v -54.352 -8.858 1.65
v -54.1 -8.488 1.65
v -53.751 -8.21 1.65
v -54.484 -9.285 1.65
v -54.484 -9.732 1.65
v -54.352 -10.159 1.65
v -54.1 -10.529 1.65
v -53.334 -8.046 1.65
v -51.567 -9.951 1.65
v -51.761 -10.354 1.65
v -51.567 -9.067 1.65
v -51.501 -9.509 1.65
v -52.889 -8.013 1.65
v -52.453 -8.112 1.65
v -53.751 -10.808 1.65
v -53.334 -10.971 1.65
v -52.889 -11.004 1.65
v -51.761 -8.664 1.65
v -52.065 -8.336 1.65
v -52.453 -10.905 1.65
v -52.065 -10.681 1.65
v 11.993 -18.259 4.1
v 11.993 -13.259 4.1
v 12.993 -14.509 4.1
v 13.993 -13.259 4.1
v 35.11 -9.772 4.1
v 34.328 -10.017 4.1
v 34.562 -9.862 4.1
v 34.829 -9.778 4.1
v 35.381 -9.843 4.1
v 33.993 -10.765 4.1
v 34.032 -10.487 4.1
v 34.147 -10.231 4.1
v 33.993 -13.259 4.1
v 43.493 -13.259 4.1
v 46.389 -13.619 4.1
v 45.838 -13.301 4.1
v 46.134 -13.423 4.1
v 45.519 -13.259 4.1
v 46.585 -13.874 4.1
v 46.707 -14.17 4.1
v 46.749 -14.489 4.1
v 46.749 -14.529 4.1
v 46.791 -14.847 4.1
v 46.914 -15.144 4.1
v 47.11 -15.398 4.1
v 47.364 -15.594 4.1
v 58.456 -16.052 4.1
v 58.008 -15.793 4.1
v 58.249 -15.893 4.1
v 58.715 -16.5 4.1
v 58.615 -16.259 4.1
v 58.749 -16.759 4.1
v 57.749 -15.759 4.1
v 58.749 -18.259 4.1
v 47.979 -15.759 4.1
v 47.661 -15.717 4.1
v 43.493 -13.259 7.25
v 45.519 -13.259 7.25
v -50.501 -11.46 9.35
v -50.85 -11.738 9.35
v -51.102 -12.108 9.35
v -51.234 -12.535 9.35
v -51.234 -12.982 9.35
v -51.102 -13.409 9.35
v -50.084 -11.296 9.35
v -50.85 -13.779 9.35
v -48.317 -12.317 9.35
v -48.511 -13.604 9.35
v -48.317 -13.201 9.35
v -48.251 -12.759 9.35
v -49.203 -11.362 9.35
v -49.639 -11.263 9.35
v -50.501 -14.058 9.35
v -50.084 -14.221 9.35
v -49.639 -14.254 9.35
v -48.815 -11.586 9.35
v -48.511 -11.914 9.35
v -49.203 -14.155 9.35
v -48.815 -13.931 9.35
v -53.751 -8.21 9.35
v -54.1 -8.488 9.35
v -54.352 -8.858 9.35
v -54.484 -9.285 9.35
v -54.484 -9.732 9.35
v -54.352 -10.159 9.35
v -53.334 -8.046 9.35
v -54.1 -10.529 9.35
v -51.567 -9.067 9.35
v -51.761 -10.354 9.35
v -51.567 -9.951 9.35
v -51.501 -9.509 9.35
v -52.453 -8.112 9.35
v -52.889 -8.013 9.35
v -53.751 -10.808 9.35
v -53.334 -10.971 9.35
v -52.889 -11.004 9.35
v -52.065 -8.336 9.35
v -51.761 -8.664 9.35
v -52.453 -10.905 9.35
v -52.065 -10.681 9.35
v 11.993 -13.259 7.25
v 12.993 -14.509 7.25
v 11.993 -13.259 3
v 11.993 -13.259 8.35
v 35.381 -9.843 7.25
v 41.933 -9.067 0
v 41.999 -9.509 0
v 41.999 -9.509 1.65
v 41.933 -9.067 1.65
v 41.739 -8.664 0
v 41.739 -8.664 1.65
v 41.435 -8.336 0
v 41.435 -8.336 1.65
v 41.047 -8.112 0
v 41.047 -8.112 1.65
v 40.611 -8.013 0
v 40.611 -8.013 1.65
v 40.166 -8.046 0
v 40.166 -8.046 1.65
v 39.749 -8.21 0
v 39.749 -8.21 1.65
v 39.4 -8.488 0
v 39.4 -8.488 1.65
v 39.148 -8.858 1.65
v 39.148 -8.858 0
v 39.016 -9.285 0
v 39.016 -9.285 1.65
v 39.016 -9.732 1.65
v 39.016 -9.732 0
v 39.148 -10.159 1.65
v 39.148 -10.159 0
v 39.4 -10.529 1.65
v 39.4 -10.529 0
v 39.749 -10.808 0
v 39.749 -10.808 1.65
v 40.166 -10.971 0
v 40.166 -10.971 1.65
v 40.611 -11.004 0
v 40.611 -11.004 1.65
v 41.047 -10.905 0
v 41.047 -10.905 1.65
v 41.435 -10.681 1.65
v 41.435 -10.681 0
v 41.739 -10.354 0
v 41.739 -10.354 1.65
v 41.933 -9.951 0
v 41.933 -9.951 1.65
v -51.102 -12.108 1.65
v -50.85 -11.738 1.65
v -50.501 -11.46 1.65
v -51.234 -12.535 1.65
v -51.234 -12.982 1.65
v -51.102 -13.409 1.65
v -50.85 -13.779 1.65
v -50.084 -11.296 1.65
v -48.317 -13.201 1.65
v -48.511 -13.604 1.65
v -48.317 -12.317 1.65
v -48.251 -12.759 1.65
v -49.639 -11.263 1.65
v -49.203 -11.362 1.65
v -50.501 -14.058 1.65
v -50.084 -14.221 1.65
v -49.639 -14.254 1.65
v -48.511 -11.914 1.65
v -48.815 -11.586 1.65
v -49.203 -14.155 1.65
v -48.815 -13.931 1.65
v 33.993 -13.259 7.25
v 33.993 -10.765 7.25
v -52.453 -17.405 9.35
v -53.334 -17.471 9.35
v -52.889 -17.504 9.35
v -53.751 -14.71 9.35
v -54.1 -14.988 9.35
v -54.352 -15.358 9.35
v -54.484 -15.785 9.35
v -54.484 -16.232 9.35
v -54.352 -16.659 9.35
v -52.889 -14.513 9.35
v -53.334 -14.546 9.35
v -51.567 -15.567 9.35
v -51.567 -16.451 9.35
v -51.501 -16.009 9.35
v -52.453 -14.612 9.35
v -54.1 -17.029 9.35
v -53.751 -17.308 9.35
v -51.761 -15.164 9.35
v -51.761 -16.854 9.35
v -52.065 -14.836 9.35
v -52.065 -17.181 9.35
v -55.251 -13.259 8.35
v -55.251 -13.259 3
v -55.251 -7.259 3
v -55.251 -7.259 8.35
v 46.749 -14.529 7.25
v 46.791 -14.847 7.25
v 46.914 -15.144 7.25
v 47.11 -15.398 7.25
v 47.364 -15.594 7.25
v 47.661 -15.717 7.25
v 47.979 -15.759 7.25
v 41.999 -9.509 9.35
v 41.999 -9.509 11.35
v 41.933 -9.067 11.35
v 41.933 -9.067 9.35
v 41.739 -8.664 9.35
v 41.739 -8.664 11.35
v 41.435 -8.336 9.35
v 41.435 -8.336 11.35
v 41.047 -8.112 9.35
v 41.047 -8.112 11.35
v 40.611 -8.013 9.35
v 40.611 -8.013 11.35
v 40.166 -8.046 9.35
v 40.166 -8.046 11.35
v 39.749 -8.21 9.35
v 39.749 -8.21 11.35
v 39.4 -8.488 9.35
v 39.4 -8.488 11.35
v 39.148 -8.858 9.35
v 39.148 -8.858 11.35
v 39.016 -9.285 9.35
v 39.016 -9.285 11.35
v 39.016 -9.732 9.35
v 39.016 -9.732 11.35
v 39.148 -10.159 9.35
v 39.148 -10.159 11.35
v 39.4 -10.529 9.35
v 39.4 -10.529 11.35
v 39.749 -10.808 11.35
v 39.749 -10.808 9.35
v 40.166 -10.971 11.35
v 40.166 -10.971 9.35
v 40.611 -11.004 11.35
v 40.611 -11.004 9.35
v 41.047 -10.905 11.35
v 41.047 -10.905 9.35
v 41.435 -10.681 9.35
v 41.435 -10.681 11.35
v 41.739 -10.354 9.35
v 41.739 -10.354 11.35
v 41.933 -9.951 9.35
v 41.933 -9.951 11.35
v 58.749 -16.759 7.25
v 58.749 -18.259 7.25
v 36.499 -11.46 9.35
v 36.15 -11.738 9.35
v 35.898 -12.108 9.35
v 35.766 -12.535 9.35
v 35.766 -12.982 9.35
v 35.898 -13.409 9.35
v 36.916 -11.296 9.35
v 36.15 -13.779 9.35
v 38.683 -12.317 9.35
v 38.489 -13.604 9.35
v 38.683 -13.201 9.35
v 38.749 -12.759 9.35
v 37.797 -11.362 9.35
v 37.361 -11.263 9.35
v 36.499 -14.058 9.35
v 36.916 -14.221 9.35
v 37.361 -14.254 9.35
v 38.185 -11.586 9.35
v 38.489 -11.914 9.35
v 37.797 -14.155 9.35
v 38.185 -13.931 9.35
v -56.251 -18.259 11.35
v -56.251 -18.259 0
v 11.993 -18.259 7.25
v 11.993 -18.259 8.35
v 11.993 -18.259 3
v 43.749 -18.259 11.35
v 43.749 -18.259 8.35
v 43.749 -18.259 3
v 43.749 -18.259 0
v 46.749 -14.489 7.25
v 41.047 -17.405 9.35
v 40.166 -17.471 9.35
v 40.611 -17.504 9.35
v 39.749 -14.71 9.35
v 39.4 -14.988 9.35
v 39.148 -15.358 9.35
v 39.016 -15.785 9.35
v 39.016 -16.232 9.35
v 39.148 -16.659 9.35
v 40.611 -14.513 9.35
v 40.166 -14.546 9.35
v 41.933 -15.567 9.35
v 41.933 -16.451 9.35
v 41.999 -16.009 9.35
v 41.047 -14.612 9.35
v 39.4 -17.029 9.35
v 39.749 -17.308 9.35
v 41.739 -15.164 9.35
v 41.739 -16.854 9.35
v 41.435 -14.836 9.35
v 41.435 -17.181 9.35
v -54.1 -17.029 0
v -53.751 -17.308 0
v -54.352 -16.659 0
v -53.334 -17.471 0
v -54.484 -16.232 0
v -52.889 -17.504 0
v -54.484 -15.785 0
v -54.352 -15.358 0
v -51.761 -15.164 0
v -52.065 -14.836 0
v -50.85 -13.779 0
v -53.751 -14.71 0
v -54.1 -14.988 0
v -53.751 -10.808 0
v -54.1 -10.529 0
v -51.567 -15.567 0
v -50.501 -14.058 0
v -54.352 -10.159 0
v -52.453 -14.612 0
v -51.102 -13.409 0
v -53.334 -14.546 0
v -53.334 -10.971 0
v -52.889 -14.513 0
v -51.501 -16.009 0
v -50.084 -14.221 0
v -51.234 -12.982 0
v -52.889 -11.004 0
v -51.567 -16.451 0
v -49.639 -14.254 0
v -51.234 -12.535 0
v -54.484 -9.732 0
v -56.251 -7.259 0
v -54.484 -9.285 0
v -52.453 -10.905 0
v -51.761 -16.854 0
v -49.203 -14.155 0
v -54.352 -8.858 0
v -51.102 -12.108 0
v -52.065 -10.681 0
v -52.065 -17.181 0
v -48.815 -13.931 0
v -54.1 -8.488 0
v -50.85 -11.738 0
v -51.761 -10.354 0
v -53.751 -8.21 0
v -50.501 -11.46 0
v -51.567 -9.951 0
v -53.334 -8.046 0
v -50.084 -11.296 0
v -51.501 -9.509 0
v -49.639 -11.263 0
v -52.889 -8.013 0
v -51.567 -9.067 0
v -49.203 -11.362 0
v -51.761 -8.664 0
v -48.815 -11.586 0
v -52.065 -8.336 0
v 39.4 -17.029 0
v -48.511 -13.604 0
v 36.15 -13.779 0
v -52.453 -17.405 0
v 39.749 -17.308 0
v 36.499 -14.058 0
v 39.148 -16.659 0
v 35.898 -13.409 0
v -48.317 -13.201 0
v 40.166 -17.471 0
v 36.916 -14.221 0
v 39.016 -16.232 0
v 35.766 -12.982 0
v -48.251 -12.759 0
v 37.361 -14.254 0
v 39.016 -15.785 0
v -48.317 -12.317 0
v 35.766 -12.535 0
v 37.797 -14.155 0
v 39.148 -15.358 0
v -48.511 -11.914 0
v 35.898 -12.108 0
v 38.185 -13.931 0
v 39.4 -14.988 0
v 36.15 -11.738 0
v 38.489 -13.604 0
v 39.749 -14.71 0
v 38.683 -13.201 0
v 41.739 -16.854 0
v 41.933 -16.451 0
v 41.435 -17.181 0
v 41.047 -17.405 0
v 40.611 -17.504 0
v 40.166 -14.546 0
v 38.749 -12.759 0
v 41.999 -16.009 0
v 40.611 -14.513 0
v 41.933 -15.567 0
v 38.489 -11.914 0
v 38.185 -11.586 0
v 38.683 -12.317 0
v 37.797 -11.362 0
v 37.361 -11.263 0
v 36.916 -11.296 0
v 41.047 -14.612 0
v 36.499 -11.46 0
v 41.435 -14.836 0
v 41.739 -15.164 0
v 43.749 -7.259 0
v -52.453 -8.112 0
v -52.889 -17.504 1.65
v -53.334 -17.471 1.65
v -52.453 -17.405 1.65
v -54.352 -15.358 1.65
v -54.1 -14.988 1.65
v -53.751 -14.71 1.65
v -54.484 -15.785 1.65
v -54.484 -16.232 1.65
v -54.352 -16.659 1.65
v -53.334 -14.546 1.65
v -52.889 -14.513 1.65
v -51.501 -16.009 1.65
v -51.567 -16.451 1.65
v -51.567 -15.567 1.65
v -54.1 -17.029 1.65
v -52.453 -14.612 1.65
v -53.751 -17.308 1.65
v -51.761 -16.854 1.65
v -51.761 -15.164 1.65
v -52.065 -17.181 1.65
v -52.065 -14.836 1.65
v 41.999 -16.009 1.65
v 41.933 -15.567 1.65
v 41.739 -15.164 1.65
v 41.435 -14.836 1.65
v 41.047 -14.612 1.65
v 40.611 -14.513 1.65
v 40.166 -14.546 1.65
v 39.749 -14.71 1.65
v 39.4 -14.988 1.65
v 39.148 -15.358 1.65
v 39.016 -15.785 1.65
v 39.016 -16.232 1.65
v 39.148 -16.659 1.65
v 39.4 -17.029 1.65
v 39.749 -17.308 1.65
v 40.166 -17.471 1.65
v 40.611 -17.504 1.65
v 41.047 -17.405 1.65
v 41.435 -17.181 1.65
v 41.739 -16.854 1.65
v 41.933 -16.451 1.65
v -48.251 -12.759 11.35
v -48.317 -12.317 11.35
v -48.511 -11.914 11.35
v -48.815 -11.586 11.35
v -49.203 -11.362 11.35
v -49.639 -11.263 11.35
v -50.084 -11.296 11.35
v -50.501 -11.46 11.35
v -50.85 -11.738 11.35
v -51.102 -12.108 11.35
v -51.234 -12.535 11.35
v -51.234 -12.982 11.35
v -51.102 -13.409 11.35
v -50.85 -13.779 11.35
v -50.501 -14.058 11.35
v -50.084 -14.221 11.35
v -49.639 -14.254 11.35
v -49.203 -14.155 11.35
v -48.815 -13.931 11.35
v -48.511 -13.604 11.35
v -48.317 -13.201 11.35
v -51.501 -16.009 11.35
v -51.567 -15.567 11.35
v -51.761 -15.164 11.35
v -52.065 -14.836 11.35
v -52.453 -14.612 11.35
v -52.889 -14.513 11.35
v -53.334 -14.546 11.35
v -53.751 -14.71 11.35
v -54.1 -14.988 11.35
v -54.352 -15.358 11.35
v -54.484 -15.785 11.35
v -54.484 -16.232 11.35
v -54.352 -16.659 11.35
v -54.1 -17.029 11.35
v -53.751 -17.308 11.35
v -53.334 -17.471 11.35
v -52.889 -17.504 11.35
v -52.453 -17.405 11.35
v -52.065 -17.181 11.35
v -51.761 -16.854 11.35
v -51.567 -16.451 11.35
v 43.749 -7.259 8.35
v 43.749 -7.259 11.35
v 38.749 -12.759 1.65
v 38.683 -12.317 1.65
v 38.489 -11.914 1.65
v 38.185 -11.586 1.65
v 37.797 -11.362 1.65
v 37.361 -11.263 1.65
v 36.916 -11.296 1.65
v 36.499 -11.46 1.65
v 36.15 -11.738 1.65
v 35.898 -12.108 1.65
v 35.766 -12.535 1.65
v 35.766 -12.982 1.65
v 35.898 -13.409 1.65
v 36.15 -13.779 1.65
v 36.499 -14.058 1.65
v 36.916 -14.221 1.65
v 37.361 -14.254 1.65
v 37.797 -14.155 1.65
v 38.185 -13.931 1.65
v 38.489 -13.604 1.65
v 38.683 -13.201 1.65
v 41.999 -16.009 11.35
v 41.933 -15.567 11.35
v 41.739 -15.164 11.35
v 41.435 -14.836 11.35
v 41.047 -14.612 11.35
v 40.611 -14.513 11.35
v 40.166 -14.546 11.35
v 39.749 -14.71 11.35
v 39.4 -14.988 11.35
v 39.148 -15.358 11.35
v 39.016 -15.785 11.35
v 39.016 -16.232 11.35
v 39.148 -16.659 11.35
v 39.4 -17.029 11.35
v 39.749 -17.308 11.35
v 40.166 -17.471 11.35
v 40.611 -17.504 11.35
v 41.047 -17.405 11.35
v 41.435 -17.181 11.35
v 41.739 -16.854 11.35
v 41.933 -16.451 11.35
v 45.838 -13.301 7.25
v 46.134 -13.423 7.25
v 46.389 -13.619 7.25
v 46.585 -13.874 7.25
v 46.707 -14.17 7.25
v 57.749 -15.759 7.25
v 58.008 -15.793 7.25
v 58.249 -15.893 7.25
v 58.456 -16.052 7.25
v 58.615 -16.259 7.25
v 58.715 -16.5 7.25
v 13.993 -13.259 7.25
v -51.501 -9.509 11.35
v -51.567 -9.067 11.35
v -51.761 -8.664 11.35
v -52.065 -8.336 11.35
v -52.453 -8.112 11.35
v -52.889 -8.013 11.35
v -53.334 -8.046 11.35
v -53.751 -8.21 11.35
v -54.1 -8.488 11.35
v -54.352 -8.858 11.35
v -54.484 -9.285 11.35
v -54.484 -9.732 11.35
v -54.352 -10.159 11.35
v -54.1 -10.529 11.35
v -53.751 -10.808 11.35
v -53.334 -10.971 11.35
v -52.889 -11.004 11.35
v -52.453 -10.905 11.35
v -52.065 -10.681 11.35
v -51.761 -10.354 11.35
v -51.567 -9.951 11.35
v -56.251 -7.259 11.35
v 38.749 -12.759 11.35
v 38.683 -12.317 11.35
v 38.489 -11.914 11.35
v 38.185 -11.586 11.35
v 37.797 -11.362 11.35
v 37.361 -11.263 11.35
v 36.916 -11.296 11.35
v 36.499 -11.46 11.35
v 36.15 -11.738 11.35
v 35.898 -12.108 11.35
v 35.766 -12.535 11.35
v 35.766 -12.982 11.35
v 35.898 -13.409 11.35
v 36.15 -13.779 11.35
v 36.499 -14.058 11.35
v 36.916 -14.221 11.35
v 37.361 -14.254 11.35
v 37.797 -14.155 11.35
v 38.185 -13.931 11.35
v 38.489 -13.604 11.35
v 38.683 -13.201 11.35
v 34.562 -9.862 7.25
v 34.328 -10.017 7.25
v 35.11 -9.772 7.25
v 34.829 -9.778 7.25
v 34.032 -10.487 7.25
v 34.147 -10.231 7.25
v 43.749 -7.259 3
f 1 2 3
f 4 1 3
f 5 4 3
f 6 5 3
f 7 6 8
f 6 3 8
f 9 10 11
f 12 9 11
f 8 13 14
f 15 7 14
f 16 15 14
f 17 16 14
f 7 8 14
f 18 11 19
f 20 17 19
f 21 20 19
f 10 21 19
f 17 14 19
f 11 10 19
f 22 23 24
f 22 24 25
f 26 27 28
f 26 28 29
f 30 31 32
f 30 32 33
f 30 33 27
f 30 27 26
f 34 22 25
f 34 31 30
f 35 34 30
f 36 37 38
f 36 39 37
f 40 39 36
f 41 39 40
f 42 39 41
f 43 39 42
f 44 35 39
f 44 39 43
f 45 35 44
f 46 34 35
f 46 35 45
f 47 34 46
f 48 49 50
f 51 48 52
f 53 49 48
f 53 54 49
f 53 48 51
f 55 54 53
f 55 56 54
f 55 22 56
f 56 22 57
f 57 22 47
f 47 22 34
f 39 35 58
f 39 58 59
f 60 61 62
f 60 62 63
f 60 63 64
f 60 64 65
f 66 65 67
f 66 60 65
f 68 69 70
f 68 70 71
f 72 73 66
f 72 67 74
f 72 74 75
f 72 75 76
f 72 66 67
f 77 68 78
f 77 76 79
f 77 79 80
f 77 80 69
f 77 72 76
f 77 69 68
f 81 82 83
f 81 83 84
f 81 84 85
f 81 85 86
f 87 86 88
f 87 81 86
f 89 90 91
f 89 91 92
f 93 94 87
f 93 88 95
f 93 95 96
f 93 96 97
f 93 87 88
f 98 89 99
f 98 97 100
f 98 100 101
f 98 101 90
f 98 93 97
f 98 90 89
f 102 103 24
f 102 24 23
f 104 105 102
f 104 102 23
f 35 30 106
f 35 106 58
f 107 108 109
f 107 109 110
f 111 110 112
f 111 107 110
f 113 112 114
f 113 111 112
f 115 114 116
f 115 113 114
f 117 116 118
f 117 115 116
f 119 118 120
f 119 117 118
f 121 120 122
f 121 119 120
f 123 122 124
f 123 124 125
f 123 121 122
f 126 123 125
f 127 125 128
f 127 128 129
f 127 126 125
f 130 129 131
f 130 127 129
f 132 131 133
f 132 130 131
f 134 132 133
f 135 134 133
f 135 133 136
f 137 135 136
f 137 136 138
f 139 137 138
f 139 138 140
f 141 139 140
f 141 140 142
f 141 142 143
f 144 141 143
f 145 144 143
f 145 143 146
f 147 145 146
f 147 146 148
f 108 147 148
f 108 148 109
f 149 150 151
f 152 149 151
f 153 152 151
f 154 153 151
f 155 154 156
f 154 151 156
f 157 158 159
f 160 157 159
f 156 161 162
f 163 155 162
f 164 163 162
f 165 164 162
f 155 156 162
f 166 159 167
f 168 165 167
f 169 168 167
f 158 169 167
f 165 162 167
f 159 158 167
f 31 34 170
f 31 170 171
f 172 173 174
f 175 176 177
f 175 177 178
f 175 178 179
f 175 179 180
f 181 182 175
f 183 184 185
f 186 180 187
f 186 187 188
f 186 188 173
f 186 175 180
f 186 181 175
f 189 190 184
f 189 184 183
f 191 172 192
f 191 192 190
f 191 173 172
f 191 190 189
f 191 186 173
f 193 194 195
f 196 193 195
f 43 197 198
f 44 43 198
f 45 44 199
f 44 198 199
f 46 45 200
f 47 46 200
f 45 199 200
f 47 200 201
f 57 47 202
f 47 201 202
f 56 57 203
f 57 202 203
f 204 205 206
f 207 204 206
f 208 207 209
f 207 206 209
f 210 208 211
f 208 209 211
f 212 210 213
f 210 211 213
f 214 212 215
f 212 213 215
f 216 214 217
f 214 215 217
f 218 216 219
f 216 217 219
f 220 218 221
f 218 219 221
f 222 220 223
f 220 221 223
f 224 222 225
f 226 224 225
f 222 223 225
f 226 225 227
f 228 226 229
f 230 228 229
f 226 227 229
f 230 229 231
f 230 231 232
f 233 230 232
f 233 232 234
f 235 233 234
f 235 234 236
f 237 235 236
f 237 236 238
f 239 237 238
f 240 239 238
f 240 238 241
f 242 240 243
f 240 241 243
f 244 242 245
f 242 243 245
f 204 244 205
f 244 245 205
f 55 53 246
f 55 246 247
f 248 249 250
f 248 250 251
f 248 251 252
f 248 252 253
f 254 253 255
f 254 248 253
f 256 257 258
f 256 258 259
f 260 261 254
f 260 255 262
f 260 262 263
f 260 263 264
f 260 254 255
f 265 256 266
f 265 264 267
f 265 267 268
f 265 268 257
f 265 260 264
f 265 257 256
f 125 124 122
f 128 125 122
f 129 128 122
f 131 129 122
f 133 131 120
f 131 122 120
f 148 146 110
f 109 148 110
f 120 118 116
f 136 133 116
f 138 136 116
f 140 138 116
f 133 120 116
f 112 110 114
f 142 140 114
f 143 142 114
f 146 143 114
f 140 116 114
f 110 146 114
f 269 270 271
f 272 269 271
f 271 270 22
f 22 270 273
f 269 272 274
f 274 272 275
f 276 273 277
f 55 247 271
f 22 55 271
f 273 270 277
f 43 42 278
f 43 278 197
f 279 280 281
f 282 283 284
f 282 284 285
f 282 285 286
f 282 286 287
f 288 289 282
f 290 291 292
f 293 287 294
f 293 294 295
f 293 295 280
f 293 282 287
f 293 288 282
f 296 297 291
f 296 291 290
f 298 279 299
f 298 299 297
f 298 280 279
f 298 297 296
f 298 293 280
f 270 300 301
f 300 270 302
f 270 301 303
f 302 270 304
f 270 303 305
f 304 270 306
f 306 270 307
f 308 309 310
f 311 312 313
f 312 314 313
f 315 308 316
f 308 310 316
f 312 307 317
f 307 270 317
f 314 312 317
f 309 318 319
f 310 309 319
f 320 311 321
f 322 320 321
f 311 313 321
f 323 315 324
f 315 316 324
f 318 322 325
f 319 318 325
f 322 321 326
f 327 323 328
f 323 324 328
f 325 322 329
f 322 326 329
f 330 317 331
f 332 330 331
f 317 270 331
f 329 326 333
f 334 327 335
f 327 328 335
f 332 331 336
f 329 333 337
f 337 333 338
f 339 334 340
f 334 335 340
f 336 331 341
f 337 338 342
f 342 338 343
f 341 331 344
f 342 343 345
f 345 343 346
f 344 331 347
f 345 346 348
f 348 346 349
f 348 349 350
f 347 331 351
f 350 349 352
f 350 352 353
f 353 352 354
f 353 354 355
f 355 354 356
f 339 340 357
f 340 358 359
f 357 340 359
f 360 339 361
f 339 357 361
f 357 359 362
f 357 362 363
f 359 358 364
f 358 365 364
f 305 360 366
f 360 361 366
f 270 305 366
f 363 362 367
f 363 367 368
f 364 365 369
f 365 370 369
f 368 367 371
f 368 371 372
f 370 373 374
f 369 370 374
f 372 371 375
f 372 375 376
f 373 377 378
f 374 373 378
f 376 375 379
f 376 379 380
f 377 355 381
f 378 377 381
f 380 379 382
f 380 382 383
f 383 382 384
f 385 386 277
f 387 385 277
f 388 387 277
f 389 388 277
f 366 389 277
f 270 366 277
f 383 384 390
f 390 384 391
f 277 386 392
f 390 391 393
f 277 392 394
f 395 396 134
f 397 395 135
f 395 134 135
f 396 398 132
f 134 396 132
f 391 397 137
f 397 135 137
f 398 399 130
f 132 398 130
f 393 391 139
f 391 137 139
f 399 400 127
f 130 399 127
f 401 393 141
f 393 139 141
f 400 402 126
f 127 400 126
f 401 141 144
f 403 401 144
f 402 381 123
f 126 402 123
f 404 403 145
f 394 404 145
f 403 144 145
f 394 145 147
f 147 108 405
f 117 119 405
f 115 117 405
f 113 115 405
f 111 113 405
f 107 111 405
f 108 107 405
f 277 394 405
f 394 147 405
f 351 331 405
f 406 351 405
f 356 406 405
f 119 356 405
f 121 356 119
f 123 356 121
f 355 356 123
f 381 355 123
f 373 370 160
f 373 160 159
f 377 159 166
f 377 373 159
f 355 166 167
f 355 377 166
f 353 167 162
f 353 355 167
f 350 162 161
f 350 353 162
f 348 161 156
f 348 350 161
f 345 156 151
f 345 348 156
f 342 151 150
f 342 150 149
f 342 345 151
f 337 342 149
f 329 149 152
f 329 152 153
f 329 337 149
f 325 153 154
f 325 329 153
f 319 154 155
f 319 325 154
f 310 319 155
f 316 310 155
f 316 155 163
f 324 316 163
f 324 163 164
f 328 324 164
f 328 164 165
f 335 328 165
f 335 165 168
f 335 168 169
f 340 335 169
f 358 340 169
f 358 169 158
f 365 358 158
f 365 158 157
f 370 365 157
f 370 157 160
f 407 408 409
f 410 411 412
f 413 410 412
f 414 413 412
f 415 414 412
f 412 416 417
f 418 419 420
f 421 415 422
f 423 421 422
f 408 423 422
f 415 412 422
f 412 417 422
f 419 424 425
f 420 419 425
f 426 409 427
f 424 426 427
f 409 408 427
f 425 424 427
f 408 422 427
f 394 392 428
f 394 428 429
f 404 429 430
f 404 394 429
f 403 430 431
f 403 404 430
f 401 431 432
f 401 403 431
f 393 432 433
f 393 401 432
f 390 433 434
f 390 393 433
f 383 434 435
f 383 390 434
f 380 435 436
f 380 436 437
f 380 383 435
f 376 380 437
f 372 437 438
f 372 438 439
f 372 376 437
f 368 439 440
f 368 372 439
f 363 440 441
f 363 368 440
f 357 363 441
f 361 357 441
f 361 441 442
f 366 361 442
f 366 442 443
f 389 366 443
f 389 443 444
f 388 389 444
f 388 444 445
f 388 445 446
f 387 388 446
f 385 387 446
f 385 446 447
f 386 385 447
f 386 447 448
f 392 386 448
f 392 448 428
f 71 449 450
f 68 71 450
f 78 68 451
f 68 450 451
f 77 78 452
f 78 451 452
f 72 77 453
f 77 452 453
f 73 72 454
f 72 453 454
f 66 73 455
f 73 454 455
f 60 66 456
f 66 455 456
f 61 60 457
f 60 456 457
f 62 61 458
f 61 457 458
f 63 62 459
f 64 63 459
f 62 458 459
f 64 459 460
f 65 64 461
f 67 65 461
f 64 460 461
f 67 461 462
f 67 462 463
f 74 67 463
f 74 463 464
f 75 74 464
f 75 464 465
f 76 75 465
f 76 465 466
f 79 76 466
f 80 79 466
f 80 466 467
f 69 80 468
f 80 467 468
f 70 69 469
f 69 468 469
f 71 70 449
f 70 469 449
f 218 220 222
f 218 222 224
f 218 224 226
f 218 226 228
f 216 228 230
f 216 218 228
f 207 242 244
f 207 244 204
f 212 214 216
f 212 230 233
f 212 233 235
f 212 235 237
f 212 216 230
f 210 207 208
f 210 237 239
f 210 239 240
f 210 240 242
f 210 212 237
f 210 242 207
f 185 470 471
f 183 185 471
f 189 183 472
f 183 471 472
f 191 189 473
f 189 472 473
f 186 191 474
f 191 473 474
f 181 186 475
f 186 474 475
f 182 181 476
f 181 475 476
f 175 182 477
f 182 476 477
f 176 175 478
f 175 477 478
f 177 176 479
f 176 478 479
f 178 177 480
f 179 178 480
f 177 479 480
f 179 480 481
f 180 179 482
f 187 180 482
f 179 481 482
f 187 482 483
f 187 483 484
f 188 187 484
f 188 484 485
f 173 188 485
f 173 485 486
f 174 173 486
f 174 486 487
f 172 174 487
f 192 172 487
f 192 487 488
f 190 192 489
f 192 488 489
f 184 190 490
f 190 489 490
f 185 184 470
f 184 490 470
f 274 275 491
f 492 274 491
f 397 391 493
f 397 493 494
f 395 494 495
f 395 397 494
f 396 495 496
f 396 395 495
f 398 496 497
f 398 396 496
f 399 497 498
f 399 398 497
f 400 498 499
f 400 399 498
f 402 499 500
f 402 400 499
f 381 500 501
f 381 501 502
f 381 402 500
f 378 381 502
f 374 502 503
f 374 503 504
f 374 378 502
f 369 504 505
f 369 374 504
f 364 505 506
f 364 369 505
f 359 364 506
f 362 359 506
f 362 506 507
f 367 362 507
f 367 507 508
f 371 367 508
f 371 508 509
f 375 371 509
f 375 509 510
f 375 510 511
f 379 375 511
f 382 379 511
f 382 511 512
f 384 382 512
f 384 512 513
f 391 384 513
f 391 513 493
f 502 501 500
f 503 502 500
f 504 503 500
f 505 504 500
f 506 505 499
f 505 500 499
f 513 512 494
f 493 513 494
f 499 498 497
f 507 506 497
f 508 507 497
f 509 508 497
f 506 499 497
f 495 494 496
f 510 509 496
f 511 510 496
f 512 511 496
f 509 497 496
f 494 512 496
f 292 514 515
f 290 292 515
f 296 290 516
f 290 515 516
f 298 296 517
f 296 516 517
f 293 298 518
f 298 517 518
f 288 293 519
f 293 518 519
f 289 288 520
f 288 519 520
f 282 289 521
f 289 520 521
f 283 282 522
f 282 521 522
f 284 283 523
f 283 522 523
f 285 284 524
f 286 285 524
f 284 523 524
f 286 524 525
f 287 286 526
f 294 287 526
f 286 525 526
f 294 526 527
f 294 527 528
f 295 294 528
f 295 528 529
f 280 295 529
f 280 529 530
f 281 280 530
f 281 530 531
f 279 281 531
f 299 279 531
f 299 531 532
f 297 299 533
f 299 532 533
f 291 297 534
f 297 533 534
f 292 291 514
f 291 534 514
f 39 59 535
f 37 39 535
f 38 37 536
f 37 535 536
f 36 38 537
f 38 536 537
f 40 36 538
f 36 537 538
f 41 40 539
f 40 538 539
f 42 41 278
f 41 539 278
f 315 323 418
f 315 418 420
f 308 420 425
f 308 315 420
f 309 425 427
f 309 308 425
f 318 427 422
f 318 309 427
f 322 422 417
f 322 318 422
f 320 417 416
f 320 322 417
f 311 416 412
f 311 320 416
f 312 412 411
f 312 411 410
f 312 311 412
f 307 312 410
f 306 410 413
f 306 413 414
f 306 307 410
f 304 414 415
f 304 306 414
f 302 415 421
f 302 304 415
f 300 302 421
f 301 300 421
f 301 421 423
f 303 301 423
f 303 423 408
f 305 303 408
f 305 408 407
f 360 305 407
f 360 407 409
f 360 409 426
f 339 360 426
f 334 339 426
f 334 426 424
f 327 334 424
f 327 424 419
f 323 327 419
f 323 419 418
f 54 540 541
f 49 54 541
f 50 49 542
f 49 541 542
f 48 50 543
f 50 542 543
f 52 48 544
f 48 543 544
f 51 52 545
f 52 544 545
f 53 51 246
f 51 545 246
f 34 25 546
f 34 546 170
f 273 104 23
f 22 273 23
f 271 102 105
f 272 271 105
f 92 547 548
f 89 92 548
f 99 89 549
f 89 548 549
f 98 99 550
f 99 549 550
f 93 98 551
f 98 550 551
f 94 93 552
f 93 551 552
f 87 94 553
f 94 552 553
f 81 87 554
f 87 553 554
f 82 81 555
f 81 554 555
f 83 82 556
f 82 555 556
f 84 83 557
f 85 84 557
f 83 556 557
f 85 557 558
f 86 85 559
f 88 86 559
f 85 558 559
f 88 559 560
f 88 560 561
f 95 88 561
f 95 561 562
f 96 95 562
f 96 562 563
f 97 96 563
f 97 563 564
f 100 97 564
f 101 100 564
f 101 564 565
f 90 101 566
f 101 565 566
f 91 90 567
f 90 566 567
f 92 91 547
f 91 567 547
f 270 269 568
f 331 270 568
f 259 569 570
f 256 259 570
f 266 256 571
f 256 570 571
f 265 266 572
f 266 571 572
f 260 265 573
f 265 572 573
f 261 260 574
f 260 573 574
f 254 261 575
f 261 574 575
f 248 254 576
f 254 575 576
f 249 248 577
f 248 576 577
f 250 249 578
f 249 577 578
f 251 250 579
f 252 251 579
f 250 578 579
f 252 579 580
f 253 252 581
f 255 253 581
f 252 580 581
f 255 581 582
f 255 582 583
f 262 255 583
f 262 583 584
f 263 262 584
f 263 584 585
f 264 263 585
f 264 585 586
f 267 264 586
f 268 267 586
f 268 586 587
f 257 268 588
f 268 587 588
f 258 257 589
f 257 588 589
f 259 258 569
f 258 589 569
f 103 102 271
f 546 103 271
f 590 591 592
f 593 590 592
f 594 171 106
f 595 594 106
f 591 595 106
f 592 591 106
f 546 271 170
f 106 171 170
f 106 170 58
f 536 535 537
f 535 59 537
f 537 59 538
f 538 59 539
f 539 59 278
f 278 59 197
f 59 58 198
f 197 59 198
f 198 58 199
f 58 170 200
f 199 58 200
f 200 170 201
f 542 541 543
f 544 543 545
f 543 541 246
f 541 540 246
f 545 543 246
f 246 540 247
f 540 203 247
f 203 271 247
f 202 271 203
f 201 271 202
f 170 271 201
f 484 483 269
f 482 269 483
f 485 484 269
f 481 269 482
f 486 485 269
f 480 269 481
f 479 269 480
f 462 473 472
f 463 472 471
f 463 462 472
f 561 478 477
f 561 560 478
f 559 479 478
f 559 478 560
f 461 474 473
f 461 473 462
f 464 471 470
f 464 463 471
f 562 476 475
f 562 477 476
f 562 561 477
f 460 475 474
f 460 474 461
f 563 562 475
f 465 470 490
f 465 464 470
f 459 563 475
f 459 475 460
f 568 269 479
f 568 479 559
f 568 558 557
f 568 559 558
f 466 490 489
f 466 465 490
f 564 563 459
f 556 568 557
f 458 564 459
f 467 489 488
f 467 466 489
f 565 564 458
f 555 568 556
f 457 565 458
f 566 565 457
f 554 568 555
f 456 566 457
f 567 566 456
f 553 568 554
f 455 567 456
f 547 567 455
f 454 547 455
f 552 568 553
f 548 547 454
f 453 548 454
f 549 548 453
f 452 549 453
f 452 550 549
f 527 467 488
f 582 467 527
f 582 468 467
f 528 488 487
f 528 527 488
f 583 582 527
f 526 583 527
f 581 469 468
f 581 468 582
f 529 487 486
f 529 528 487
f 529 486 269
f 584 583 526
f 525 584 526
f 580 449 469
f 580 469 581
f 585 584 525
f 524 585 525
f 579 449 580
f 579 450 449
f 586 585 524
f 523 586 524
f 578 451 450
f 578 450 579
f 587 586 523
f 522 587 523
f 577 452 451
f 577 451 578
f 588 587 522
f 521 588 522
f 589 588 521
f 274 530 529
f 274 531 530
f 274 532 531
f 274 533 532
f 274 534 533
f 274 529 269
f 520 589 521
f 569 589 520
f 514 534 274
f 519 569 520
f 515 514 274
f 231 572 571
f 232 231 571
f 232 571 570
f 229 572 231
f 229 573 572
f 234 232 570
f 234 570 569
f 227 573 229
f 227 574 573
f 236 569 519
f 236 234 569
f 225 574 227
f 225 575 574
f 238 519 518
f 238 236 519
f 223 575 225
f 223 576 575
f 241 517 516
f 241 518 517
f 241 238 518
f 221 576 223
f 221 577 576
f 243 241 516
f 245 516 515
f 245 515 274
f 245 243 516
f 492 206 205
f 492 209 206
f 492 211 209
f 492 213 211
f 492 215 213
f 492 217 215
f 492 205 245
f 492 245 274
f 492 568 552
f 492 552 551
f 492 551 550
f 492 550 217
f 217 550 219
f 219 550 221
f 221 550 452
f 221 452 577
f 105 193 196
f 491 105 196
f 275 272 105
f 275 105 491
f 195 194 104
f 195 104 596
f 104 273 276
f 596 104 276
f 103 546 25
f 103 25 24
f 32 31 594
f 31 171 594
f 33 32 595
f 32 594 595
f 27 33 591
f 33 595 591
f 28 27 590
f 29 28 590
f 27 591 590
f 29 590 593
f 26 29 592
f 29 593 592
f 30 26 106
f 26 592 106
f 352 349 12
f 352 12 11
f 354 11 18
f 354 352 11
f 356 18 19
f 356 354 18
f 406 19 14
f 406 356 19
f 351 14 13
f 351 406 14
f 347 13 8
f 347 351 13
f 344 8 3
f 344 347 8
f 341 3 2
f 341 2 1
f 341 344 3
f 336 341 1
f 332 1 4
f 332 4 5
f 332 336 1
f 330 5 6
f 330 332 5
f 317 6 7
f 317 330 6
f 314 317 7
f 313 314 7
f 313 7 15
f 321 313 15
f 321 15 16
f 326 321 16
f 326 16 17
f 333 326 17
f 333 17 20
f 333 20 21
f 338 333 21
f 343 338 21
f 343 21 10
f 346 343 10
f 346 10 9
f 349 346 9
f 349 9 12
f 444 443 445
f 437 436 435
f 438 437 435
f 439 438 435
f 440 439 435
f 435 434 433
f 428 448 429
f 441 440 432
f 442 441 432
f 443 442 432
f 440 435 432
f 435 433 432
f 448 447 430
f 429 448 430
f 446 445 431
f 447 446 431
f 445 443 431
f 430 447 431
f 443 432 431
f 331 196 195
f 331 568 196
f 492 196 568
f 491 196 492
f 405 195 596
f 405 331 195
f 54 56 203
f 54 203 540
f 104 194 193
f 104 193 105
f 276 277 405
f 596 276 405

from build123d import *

# Parameters (mm, degrees)
SKETCH008_W     = 100
SKETCH008_H     = 11
PAD006_DEPTH    = 3
PAD007_DEPTH    = 5.35
SKETCH010_W     = 100
SKETCH010_H     = 11
PAD008_DEPTH    = 3
POCKET002_DEPTH = 5.35
FILLET005_R     = 1.23
FILLET006_R     = 1
SKETCH014_W     = 46.756413
SKETCH014_H     = 1.1
POCKET004_DEPTH = 12
FILLET007_R     = 1
SKETCH015_R     = 1.5
POCKET005_DEPTH = 2
SKETCH018_W     = 1
SKETCH018_H     = 6
PAD011_DEPTH    = 5.35


with BuildPart() as part:
    # Sketch008 → Pad006 (new body)
    with BuildSketch(Plane.XY):
        with Locations((-6.250698, -12.758651)):
            Rectangle(SKETCH008_W, SKETCH008_H)
    extrude(amount=PAD006_DEPTH)

    # Sketch009 (on Face6 of Pad006) → Pad007 (join)
    with BuildSketch(Plane.XY.offset(3)):
        Polygon((-56.250698, -13.258651), (33.992889, -13.258651), (33.992889, -9.258651), (43.492889, -13.258651), (46.749302, -13.258651), (46.749302, -15.758651), (58.749302, -15.758651), (58.749302, -18.258651), (-56.250698, -18.258651), align=None)
    extrude(amount=PAD007_DEPTH)

    # Sketch010 (on Face14 of Pad007) → Pad008 (join)
    with BuildSketch(Plane.XY.offset(8.35)):
        with Locations((-6.250698, -12.758651)):
            Rectangle(SKETCH010_W, SKETCH010_H)
    extrude(amount=PAD008_DEPTH)

    # Sketch011 (on Face14 of Pad007) → Pocket002 (cut)
    with BuildSketch(Plane.XY.offset(8.35)):
        Polygon((13.992889, -13.258651), (12.992889, -14.508651), (11.992889, -13.258651), align=None)
    extrude(amount=-POCKET002_DEPTH, mode=Mode.SUBTRACT)

    # Fillet005
    fillet005_edges = [part.edges().sort_by_distance(p)[0] for p in [
        (46.749302, -13.258651, 5.675),
        (46.749302, -15.758651, 5.675),
    ]]
    fillet(fillet005_edges, radius=FILLET005_R)

    # Fillet006
    fillet006_edges = [part.edges().sort_by_distance(p)[0] for p in [
        (58.749302, -15.758651, 5.675),
    ]]
    fillet(fillet006_edges, radius=FILLET006_R)

    # Sketch014 (on Face7 of Fillet006) → Pocket004 (cut)
    with BuildSketch(Plane.XZ.offset(18.258651)):
        with Locations((35.371096, 7.8)):
            Rectangle(SKETCH014_W, SKETCH014_H)
        with Locations((35.371096, 3.55)):
            Rectangle(SKETCH014_W, SKETCH014_H)
    extrude(amount=-POCKET004_DEPTH, mode=Mode.SUBTRACT)

    # Fillet007
    fillet007_edges = [part.edges().sort_by_distance(p)[0] for p in [
        (33.992889, -9.258651, 5.675),
    ]]
    fillet(fillet007_edges, radius=FILLET007_R)

    # Sketch015 (on Face34 of Fillet007) → Pocket005 (cut)
    with BuildSketch(Plane.XY.offset(11.35)):
        with Locations((-53.000698, -9.508651)):
            Circle(SKETCH015_R)
        with Locations((-49.750698, -12.758651)):
            Circle(SKETCH015_R)
        with Locations((-53.000698, -16.008651)):
            Circle(SKETCH015_R)
        with Locations((40.499302, -9.508651)):
            Circle(SKETCH015_R)
        with Locations((37.249302, -12.758651)):
            Circle(SKETCH015_R)
        with Locations((40.499302, -16.008651)):
            Circle(SKETCH015_R)
    pocket005 = extrude(amount=-POCKET005_DEPTH, mode=Mode.SUBTRACT)

    # Mirrored: Pocket005 across face of ReferencePlane
    add(pocket005.mirror(Plane(origin=(-57, -18, 5.5), x_dir=(1, 0, 0), z_dir=(0, 0, 1))), mode=Mode.SUBTRACT)

    # Sketch018 (on Face24 of Mirrored) → Pad011 (join)
    with BuildSketch(Plane.XY.offset(3)):
        with Locations((-55.750698, -10.258651)):
            Rectangle(SKETCH018_W, SKETCH018_H)
    extrude(amount=PAD011_DEPTH)


solid = part.part
